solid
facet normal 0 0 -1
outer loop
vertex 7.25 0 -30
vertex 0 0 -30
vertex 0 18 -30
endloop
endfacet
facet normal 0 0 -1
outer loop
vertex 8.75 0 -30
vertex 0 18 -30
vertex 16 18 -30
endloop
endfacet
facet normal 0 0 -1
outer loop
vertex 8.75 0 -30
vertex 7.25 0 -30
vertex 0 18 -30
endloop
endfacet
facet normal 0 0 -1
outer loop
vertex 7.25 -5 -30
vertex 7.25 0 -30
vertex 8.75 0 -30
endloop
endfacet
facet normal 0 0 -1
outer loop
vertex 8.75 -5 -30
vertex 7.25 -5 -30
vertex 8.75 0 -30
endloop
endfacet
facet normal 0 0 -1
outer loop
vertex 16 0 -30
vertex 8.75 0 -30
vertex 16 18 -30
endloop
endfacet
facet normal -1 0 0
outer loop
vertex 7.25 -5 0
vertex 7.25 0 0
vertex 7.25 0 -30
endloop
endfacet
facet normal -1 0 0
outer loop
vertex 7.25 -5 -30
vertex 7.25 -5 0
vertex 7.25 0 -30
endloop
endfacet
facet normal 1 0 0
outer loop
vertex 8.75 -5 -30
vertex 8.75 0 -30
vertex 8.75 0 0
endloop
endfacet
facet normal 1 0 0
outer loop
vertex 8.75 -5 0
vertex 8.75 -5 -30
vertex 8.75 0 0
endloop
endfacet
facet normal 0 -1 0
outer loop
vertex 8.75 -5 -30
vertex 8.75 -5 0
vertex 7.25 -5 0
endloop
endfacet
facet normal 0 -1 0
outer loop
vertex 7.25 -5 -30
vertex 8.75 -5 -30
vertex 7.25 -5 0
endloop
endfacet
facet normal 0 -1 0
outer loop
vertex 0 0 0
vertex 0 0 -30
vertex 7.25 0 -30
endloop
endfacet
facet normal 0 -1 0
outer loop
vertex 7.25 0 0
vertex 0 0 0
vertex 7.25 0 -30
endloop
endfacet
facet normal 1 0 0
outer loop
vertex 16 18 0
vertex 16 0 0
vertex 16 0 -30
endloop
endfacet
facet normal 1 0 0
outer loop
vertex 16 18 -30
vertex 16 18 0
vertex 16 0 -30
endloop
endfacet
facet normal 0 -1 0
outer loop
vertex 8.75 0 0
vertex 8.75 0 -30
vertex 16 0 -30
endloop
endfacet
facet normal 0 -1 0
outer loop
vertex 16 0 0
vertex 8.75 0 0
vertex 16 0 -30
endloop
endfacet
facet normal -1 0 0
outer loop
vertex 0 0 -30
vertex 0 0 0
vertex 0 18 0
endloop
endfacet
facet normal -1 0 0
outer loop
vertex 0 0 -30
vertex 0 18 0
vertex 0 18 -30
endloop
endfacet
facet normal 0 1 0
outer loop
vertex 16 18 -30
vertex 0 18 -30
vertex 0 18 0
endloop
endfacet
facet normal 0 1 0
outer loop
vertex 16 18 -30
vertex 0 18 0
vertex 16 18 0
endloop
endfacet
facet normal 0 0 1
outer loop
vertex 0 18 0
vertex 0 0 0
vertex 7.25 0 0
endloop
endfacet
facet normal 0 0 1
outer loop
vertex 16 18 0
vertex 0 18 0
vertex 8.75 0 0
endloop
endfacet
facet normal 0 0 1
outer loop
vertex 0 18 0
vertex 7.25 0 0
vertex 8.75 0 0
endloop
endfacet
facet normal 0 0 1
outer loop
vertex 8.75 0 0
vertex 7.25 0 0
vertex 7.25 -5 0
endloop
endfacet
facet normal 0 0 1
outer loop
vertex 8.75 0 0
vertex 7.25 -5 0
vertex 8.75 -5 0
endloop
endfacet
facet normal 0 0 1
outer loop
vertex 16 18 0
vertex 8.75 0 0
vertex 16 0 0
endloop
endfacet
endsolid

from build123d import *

# Parameters (mm, degrees)
SKETCH_1_W      = 16
SKETCH_1_H      = 30
EXTRUDE_1_DEPTH = 18
EXTRUDE_2_DEPTH = 5


with BuildPart() as part:
    # Эскиз1 → Бобышка-Вытянуть1 (new body)
    with BuildSketch(Plane(origin=(0, 0, 0), x_dir=(1, 0, 0), z_dir=(0, 1, 0))):
        with Locations((8, 15)):
            Rectangle(SKETCH_1_W, SKETCH_1_H)
    extrude(amount=EXTRUDE_1_DEPTH)

    # Эскиз2 → Бобышка-Вытянуть2 (add)
    with BuildSketch(Plane.XZ):
        Polygon((7.25, -15), (7.25, 0), (8.75, 0), (8.75, -15), (8.75, -30), (7.25, -30), align=None)
    extrude(amount=EXTRUDE_2_DEPTH)


solid = part.part
